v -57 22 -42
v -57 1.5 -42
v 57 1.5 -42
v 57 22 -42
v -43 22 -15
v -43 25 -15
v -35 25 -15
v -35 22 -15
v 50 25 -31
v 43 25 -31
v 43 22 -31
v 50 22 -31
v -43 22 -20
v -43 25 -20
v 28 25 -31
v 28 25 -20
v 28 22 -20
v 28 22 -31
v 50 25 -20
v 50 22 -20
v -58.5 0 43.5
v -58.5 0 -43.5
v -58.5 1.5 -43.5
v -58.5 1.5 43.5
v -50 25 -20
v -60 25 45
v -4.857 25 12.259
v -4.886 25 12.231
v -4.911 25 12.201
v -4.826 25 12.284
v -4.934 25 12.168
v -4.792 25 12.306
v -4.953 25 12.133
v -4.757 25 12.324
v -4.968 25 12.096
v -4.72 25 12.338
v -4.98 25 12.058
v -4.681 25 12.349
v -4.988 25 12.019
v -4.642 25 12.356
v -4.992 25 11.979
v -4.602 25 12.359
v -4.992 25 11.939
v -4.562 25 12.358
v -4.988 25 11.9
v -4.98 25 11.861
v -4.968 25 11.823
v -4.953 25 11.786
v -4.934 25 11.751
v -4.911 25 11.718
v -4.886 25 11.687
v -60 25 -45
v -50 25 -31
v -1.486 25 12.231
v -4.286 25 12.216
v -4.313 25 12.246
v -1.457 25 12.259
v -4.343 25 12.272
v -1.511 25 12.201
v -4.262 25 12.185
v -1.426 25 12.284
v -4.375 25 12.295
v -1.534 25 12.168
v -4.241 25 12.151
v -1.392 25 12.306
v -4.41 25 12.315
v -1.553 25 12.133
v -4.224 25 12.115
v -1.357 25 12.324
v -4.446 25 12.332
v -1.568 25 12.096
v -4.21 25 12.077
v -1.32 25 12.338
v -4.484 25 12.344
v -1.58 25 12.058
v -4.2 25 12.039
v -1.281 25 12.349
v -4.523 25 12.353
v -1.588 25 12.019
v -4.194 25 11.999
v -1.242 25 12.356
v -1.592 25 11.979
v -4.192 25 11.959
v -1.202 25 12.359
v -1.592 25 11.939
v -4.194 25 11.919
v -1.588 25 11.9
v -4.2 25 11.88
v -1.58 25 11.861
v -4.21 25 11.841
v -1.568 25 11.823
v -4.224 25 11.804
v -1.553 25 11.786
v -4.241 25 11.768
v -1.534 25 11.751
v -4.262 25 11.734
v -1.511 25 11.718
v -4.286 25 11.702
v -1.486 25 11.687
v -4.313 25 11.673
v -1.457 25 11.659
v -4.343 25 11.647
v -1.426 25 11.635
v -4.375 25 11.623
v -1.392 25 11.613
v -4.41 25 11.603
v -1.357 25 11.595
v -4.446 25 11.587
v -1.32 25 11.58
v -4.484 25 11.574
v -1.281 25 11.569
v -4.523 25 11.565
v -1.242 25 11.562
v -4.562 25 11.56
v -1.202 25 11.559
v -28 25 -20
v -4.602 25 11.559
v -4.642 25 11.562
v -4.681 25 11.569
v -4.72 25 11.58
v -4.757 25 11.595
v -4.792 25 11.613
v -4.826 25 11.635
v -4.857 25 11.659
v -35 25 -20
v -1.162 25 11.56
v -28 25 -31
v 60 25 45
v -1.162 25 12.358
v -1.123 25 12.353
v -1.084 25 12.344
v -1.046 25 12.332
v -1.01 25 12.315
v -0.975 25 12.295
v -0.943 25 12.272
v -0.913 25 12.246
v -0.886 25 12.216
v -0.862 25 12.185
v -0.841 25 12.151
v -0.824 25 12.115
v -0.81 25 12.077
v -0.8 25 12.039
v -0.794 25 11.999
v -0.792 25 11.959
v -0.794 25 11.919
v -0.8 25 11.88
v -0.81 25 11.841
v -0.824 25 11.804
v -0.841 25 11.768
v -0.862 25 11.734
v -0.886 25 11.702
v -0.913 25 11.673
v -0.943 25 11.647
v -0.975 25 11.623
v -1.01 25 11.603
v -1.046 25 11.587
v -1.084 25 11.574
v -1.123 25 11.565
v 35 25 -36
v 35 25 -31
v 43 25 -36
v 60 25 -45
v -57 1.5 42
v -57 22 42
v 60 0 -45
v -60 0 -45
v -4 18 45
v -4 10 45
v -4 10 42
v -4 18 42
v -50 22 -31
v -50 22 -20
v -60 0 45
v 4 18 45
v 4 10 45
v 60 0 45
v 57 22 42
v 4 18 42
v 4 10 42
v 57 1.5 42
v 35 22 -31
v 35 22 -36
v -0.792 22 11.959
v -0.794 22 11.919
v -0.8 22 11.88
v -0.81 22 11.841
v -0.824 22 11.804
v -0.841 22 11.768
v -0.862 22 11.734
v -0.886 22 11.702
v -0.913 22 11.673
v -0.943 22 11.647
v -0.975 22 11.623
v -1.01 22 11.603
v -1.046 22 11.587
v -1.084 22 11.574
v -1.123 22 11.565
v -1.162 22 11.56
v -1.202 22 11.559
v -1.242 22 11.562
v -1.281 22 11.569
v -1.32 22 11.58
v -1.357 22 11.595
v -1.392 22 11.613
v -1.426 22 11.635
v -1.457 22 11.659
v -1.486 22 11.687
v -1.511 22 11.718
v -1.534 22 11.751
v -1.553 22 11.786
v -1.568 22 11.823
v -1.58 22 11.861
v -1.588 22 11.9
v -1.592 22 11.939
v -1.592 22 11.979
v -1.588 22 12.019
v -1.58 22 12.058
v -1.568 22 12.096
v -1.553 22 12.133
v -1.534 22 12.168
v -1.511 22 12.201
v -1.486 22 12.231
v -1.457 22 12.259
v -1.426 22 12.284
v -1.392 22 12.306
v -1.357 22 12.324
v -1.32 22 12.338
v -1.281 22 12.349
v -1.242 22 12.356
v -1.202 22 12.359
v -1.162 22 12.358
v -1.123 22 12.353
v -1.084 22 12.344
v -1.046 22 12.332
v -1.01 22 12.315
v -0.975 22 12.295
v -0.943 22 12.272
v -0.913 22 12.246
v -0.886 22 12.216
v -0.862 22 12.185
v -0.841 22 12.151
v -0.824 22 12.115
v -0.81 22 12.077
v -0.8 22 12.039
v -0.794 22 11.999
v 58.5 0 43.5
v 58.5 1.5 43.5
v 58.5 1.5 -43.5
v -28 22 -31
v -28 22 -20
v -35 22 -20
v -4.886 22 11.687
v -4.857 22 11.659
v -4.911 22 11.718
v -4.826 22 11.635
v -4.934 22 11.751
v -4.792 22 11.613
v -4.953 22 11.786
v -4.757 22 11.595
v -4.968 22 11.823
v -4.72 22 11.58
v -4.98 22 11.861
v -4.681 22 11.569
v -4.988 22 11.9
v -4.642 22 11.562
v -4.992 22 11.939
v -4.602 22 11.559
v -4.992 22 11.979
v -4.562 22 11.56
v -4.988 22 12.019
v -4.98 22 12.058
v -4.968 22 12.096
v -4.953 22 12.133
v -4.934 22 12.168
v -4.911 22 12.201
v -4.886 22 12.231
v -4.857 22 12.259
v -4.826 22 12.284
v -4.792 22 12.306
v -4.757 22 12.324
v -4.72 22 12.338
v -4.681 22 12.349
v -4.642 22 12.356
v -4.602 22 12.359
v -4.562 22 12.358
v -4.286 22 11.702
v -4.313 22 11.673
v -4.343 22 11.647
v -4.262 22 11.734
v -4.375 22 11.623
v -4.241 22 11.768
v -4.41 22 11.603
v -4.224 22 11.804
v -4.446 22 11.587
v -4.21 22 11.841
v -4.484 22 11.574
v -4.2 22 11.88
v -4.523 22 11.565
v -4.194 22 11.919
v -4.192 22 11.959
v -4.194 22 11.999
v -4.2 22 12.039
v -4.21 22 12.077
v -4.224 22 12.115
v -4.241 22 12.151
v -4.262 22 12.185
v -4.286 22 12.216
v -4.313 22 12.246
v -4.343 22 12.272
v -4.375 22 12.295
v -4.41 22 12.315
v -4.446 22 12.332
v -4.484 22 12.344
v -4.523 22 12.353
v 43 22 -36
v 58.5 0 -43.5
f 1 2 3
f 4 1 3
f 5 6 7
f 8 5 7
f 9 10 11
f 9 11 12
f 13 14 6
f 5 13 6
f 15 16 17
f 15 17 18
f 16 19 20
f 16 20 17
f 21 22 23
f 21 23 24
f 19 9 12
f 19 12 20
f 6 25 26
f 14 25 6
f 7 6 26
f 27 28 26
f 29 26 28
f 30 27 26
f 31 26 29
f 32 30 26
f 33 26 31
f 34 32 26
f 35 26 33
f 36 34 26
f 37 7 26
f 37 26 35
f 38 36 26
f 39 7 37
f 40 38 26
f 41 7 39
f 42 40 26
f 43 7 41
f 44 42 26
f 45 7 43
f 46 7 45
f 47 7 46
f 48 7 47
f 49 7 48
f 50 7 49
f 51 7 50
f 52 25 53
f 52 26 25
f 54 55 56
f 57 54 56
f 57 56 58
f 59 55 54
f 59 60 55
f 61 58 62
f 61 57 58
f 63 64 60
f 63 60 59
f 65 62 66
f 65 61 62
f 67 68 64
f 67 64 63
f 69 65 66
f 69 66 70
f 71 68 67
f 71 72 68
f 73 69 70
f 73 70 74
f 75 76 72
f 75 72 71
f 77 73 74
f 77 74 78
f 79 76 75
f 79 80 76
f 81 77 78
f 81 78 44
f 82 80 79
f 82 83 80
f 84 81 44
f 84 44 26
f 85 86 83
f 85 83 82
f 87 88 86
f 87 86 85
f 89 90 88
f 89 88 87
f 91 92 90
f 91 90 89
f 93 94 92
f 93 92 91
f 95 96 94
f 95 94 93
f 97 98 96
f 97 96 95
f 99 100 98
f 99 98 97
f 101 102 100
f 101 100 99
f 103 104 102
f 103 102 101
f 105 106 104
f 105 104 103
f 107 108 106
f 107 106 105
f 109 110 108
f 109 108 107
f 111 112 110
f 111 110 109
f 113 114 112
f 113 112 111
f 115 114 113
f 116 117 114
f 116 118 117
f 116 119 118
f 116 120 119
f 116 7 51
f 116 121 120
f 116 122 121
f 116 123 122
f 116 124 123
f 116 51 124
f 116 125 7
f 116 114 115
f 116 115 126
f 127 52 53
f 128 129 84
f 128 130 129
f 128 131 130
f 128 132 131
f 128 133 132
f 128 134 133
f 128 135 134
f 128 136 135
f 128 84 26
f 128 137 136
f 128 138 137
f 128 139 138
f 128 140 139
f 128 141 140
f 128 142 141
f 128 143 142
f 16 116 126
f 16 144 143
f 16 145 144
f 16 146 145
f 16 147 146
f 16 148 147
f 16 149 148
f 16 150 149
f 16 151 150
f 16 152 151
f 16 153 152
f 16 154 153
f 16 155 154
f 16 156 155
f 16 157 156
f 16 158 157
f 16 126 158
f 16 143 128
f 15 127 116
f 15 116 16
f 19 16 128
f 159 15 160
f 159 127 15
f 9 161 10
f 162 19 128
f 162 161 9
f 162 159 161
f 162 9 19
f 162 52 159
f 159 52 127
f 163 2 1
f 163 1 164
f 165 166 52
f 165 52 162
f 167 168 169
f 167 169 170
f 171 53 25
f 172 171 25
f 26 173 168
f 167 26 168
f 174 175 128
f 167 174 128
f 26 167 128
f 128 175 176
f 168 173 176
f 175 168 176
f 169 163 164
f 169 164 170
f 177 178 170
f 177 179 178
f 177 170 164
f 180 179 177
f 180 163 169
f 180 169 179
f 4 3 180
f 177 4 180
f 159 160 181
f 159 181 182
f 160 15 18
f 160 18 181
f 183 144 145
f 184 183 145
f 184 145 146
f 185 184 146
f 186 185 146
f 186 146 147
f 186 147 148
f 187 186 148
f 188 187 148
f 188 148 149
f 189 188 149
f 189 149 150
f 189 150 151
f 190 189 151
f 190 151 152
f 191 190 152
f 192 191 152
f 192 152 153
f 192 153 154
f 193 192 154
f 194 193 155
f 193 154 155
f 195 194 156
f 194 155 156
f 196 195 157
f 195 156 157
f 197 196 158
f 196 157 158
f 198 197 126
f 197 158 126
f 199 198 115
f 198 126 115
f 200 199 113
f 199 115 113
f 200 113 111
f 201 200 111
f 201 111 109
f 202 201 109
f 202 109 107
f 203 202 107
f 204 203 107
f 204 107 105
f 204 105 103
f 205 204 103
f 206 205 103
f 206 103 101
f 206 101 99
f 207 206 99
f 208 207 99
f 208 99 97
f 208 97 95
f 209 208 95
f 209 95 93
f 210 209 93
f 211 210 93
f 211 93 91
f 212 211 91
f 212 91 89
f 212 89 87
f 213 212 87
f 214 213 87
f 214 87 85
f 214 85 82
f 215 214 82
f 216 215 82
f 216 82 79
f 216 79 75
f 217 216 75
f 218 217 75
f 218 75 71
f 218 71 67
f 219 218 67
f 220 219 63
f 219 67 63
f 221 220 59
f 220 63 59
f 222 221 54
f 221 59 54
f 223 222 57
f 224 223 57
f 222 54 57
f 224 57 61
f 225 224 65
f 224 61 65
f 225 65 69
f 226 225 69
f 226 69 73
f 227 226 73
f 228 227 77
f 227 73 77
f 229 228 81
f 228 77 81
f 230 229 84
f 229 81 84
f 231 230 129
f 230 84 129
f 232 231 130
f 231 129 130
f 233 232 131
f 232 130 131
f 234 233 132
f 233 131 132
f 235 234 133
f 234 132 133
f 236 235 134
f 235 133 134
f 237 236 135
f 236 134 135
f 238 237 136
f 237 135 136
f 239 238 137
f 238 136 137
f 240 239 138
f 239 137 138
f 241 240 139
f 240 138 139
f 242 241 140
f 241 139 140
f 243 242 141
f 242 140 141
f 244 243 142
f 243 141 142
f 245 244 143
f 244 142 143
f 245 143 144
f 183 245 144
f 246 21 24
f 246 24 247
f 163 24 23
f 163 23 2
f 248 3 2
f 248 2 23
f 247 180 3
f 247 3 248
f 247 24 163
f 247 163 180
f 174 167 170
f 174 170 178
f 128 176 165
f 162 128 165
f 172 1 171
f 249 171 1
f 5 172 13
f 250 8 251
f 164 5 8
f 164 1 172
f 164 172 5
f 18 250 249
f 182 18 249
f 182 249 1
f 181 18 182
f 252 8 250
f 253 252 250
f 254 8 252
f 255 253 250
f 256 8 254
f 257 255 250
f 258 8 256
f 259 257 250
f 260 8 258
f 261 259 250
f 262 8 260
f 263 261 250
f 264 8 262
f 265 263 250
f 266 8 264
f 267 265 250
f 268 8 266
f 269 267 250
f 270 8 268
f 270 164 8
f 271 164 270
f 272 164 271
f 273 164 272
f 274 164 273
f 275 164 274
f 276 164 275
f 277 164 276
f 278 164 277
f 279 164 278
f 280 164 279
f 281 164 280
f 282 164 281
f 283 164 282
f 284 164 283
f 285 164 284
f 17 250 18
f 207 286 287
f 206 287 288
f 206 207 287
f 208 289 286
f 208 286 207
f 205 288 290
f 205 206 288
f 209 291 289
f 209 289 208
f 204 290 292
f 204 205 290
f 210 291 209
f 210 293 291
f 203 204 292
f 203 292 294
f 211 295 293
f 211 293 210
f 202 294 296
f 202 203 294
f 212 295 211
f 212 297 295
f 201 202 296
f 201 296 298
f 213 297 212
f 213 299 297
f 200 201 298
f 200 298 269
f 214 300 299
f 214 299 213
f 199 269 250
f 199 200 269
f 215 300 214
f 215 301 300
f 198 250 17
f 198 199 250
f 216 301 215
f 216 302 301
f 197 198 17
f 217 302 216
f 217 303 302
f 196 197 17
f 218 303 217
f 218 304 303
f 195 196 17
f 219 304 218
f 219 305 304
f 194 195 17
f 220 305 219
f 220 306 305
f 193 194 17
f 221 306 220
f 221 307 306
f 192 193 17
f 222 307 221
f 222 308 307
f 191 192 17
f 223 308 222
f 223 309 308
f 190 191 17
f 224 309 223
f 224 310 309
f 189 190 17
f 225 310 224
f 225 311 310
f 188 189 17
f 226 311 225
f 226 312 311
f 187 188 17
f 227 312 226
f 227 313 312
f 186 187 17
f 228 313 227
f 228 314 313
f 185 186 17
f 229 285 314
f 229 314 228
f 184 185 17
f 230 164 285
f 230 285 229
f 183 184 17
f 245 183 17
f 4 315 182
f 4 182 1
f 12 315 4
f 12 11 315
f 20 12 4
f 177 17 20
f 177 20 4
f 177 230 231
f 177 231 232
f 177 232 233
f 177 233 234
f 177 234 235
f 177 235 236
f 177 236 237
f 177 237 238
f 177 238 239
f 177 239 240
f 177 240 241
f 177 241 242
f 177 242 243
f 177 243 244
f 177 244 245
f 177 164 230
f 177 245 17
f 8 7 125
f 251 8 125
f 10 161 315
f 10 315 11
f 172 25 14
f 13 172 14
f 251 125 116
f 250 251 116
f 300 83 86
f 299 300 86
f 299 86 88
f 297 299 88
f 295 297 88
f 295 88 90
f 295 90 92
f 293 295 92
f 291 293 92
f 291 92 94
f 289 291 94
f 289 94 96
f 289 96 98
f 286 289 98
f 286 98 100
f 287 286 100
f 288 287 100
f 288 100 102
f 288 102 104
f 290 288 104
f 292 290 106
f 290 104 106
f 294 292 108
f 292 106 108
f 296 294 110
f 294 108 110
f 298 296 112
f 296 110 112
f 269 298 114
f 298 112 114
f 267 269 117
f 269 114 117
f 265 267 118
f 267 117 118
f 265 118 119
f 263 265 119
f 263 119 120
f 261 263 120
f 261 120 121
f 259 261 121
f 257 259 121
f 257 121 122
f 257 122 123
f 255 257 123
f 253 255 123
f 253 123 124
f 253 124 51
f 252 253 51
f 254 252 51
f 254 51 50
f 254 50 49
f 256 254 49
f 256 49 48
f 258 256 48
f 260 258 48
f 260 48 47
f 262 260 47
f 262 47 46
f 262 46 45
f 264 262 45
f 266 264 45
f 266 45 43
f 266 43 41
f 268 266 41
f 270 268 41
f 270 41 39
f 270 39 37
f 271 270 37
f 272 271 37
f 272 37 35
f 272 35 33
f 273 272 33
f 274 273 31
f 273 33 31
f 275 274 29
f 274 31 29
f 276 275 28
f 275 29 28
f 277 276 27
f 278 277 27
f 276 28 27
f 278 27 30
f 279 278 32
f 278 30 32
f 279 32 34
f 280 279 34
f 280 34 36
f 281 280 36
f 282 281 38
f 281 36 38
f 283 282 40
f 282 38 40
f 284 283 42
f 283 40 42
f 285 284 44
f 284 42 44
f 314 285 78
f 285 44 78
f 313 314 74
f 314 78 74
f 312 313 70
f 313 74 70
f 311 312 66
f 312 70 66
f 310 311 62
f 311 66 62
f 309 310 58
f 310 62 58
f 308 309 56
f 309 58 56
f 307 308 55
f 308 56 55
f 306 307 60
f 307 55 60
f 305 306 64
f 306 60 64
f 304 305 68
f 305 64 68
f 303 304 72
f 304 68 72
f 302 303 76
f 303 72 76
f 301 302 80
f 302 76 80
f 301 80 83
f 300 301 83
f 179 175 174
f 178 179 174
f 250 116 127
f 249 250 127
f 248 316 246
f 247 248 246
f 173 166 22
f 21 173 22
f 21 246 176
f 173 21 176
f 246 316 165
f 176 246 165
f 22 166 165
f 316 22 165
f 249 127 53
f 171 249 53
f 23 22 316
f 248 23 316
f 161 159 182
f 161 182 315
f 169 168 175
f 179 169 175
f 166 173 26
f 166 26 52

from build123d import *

# Parameters (mm, degrees)
SKETCH1_W           = 120
SKETCH1_H           = 90
BOSS_EXTRUDE1_DEPTH = 25
SKETCH2_W           = 114
SKETCH2_H           = 84
CUT_EXTRUDE1_DEPTH  = 22
SKETCH3_W           = 117
SKETCH3_H           = 87
CUT_EXTRUDE2_DEPTH  = 1.5
CUT_EXTRUDE3_DEPTH  = 11.5
SKETCH5_W           = 8
SKETCH5_H           = 8
CUT_EXTRUDE4_DEPTH  = 11.5
SKETCH6_R           = 0.4
CUT_EXTRUDE6_DEPTH  = 21.5


with BuildPart() as part:
    # Sketch1 → Boss-Extrude1 (new body)
    with BuildSketch(Plane(origin=(0, 0, 0), x_dir=(1, 0, 0), z_dir=(0, 1, 0))):
        Rectangle(SKETCH1_W, SKETCH1_H)
    extrude(amount=BOSS_EXTRUDE1_DEPTH)

    # Sketch2 → Cut-Extrude1 (cut)
    with BuildSketch(Plane.XZ):
        Rectangle(SKETCH2_W, SKETCH2_H)
    extrude(amount=-CUT_EXTRUDE1_DEPTH, mode=Mode.SUBTRACT)

    # Sketch3 → Cut-Extrude2 (cut)
    with BuildSketch(Plane.XZ):
        Rectangle(SKETCH3_W, SKETCH3_H)
    extrude(amount=-CUT_EXTRUDE2_DEPTH, mode=Mode.SUBTRACT)

    # Sketch4 → Cut-Extrude3 (cut)
    with BuildSketch(Plane(origin=(0, 25, 0), x_dir=(1, 0, 0), z_dir=(0, 1, 0))):
        Polygon((28, 31), (35, 31), (35, 36), (43, 36), (43, 31), (50, 31), (50, 20), (28, 20), align=None)
        Polygon((-50, 31), (-50, 20), (-43, 20), (-43, 15), (-35, 15), (-35, 20), (-28, 20), (-28, 31), align=None)
    extrude(amount=-CUT_EXTRUDE3_DEPTH, mode=Mode.SUBTRACT)

    # Sketch5 → Cut-Extrude4 (cut)
    with BuildSketch(Plane.XY.offset(45)):
        with Locations((0, 14)):
            Rectangle(SKETCH5_W, SKETCH5_H)
    extrude(amount=-CUT_EXTRUDE4_DEPTH, mode=Mode.SUBTRACT)

    # Sketch6 → Cut-Extrude6 (cut)
    with BuildSketch(Plane(origin=(0, 25, 0), x_dir=(1, 0, 0), z_dir=(0, 1, 0))):
        with Locations((-4.59237925, -11.959320964)):
            Circle(SKETCH6_R)
        with Locations((-1.19237925, -11.959320964)):
            Circle(SKETCH6_R)
    extrude(amount=-CUT_EXTRUDE6_DEPTH, mode=Mode.SUBTRACT)


solid = part.part
